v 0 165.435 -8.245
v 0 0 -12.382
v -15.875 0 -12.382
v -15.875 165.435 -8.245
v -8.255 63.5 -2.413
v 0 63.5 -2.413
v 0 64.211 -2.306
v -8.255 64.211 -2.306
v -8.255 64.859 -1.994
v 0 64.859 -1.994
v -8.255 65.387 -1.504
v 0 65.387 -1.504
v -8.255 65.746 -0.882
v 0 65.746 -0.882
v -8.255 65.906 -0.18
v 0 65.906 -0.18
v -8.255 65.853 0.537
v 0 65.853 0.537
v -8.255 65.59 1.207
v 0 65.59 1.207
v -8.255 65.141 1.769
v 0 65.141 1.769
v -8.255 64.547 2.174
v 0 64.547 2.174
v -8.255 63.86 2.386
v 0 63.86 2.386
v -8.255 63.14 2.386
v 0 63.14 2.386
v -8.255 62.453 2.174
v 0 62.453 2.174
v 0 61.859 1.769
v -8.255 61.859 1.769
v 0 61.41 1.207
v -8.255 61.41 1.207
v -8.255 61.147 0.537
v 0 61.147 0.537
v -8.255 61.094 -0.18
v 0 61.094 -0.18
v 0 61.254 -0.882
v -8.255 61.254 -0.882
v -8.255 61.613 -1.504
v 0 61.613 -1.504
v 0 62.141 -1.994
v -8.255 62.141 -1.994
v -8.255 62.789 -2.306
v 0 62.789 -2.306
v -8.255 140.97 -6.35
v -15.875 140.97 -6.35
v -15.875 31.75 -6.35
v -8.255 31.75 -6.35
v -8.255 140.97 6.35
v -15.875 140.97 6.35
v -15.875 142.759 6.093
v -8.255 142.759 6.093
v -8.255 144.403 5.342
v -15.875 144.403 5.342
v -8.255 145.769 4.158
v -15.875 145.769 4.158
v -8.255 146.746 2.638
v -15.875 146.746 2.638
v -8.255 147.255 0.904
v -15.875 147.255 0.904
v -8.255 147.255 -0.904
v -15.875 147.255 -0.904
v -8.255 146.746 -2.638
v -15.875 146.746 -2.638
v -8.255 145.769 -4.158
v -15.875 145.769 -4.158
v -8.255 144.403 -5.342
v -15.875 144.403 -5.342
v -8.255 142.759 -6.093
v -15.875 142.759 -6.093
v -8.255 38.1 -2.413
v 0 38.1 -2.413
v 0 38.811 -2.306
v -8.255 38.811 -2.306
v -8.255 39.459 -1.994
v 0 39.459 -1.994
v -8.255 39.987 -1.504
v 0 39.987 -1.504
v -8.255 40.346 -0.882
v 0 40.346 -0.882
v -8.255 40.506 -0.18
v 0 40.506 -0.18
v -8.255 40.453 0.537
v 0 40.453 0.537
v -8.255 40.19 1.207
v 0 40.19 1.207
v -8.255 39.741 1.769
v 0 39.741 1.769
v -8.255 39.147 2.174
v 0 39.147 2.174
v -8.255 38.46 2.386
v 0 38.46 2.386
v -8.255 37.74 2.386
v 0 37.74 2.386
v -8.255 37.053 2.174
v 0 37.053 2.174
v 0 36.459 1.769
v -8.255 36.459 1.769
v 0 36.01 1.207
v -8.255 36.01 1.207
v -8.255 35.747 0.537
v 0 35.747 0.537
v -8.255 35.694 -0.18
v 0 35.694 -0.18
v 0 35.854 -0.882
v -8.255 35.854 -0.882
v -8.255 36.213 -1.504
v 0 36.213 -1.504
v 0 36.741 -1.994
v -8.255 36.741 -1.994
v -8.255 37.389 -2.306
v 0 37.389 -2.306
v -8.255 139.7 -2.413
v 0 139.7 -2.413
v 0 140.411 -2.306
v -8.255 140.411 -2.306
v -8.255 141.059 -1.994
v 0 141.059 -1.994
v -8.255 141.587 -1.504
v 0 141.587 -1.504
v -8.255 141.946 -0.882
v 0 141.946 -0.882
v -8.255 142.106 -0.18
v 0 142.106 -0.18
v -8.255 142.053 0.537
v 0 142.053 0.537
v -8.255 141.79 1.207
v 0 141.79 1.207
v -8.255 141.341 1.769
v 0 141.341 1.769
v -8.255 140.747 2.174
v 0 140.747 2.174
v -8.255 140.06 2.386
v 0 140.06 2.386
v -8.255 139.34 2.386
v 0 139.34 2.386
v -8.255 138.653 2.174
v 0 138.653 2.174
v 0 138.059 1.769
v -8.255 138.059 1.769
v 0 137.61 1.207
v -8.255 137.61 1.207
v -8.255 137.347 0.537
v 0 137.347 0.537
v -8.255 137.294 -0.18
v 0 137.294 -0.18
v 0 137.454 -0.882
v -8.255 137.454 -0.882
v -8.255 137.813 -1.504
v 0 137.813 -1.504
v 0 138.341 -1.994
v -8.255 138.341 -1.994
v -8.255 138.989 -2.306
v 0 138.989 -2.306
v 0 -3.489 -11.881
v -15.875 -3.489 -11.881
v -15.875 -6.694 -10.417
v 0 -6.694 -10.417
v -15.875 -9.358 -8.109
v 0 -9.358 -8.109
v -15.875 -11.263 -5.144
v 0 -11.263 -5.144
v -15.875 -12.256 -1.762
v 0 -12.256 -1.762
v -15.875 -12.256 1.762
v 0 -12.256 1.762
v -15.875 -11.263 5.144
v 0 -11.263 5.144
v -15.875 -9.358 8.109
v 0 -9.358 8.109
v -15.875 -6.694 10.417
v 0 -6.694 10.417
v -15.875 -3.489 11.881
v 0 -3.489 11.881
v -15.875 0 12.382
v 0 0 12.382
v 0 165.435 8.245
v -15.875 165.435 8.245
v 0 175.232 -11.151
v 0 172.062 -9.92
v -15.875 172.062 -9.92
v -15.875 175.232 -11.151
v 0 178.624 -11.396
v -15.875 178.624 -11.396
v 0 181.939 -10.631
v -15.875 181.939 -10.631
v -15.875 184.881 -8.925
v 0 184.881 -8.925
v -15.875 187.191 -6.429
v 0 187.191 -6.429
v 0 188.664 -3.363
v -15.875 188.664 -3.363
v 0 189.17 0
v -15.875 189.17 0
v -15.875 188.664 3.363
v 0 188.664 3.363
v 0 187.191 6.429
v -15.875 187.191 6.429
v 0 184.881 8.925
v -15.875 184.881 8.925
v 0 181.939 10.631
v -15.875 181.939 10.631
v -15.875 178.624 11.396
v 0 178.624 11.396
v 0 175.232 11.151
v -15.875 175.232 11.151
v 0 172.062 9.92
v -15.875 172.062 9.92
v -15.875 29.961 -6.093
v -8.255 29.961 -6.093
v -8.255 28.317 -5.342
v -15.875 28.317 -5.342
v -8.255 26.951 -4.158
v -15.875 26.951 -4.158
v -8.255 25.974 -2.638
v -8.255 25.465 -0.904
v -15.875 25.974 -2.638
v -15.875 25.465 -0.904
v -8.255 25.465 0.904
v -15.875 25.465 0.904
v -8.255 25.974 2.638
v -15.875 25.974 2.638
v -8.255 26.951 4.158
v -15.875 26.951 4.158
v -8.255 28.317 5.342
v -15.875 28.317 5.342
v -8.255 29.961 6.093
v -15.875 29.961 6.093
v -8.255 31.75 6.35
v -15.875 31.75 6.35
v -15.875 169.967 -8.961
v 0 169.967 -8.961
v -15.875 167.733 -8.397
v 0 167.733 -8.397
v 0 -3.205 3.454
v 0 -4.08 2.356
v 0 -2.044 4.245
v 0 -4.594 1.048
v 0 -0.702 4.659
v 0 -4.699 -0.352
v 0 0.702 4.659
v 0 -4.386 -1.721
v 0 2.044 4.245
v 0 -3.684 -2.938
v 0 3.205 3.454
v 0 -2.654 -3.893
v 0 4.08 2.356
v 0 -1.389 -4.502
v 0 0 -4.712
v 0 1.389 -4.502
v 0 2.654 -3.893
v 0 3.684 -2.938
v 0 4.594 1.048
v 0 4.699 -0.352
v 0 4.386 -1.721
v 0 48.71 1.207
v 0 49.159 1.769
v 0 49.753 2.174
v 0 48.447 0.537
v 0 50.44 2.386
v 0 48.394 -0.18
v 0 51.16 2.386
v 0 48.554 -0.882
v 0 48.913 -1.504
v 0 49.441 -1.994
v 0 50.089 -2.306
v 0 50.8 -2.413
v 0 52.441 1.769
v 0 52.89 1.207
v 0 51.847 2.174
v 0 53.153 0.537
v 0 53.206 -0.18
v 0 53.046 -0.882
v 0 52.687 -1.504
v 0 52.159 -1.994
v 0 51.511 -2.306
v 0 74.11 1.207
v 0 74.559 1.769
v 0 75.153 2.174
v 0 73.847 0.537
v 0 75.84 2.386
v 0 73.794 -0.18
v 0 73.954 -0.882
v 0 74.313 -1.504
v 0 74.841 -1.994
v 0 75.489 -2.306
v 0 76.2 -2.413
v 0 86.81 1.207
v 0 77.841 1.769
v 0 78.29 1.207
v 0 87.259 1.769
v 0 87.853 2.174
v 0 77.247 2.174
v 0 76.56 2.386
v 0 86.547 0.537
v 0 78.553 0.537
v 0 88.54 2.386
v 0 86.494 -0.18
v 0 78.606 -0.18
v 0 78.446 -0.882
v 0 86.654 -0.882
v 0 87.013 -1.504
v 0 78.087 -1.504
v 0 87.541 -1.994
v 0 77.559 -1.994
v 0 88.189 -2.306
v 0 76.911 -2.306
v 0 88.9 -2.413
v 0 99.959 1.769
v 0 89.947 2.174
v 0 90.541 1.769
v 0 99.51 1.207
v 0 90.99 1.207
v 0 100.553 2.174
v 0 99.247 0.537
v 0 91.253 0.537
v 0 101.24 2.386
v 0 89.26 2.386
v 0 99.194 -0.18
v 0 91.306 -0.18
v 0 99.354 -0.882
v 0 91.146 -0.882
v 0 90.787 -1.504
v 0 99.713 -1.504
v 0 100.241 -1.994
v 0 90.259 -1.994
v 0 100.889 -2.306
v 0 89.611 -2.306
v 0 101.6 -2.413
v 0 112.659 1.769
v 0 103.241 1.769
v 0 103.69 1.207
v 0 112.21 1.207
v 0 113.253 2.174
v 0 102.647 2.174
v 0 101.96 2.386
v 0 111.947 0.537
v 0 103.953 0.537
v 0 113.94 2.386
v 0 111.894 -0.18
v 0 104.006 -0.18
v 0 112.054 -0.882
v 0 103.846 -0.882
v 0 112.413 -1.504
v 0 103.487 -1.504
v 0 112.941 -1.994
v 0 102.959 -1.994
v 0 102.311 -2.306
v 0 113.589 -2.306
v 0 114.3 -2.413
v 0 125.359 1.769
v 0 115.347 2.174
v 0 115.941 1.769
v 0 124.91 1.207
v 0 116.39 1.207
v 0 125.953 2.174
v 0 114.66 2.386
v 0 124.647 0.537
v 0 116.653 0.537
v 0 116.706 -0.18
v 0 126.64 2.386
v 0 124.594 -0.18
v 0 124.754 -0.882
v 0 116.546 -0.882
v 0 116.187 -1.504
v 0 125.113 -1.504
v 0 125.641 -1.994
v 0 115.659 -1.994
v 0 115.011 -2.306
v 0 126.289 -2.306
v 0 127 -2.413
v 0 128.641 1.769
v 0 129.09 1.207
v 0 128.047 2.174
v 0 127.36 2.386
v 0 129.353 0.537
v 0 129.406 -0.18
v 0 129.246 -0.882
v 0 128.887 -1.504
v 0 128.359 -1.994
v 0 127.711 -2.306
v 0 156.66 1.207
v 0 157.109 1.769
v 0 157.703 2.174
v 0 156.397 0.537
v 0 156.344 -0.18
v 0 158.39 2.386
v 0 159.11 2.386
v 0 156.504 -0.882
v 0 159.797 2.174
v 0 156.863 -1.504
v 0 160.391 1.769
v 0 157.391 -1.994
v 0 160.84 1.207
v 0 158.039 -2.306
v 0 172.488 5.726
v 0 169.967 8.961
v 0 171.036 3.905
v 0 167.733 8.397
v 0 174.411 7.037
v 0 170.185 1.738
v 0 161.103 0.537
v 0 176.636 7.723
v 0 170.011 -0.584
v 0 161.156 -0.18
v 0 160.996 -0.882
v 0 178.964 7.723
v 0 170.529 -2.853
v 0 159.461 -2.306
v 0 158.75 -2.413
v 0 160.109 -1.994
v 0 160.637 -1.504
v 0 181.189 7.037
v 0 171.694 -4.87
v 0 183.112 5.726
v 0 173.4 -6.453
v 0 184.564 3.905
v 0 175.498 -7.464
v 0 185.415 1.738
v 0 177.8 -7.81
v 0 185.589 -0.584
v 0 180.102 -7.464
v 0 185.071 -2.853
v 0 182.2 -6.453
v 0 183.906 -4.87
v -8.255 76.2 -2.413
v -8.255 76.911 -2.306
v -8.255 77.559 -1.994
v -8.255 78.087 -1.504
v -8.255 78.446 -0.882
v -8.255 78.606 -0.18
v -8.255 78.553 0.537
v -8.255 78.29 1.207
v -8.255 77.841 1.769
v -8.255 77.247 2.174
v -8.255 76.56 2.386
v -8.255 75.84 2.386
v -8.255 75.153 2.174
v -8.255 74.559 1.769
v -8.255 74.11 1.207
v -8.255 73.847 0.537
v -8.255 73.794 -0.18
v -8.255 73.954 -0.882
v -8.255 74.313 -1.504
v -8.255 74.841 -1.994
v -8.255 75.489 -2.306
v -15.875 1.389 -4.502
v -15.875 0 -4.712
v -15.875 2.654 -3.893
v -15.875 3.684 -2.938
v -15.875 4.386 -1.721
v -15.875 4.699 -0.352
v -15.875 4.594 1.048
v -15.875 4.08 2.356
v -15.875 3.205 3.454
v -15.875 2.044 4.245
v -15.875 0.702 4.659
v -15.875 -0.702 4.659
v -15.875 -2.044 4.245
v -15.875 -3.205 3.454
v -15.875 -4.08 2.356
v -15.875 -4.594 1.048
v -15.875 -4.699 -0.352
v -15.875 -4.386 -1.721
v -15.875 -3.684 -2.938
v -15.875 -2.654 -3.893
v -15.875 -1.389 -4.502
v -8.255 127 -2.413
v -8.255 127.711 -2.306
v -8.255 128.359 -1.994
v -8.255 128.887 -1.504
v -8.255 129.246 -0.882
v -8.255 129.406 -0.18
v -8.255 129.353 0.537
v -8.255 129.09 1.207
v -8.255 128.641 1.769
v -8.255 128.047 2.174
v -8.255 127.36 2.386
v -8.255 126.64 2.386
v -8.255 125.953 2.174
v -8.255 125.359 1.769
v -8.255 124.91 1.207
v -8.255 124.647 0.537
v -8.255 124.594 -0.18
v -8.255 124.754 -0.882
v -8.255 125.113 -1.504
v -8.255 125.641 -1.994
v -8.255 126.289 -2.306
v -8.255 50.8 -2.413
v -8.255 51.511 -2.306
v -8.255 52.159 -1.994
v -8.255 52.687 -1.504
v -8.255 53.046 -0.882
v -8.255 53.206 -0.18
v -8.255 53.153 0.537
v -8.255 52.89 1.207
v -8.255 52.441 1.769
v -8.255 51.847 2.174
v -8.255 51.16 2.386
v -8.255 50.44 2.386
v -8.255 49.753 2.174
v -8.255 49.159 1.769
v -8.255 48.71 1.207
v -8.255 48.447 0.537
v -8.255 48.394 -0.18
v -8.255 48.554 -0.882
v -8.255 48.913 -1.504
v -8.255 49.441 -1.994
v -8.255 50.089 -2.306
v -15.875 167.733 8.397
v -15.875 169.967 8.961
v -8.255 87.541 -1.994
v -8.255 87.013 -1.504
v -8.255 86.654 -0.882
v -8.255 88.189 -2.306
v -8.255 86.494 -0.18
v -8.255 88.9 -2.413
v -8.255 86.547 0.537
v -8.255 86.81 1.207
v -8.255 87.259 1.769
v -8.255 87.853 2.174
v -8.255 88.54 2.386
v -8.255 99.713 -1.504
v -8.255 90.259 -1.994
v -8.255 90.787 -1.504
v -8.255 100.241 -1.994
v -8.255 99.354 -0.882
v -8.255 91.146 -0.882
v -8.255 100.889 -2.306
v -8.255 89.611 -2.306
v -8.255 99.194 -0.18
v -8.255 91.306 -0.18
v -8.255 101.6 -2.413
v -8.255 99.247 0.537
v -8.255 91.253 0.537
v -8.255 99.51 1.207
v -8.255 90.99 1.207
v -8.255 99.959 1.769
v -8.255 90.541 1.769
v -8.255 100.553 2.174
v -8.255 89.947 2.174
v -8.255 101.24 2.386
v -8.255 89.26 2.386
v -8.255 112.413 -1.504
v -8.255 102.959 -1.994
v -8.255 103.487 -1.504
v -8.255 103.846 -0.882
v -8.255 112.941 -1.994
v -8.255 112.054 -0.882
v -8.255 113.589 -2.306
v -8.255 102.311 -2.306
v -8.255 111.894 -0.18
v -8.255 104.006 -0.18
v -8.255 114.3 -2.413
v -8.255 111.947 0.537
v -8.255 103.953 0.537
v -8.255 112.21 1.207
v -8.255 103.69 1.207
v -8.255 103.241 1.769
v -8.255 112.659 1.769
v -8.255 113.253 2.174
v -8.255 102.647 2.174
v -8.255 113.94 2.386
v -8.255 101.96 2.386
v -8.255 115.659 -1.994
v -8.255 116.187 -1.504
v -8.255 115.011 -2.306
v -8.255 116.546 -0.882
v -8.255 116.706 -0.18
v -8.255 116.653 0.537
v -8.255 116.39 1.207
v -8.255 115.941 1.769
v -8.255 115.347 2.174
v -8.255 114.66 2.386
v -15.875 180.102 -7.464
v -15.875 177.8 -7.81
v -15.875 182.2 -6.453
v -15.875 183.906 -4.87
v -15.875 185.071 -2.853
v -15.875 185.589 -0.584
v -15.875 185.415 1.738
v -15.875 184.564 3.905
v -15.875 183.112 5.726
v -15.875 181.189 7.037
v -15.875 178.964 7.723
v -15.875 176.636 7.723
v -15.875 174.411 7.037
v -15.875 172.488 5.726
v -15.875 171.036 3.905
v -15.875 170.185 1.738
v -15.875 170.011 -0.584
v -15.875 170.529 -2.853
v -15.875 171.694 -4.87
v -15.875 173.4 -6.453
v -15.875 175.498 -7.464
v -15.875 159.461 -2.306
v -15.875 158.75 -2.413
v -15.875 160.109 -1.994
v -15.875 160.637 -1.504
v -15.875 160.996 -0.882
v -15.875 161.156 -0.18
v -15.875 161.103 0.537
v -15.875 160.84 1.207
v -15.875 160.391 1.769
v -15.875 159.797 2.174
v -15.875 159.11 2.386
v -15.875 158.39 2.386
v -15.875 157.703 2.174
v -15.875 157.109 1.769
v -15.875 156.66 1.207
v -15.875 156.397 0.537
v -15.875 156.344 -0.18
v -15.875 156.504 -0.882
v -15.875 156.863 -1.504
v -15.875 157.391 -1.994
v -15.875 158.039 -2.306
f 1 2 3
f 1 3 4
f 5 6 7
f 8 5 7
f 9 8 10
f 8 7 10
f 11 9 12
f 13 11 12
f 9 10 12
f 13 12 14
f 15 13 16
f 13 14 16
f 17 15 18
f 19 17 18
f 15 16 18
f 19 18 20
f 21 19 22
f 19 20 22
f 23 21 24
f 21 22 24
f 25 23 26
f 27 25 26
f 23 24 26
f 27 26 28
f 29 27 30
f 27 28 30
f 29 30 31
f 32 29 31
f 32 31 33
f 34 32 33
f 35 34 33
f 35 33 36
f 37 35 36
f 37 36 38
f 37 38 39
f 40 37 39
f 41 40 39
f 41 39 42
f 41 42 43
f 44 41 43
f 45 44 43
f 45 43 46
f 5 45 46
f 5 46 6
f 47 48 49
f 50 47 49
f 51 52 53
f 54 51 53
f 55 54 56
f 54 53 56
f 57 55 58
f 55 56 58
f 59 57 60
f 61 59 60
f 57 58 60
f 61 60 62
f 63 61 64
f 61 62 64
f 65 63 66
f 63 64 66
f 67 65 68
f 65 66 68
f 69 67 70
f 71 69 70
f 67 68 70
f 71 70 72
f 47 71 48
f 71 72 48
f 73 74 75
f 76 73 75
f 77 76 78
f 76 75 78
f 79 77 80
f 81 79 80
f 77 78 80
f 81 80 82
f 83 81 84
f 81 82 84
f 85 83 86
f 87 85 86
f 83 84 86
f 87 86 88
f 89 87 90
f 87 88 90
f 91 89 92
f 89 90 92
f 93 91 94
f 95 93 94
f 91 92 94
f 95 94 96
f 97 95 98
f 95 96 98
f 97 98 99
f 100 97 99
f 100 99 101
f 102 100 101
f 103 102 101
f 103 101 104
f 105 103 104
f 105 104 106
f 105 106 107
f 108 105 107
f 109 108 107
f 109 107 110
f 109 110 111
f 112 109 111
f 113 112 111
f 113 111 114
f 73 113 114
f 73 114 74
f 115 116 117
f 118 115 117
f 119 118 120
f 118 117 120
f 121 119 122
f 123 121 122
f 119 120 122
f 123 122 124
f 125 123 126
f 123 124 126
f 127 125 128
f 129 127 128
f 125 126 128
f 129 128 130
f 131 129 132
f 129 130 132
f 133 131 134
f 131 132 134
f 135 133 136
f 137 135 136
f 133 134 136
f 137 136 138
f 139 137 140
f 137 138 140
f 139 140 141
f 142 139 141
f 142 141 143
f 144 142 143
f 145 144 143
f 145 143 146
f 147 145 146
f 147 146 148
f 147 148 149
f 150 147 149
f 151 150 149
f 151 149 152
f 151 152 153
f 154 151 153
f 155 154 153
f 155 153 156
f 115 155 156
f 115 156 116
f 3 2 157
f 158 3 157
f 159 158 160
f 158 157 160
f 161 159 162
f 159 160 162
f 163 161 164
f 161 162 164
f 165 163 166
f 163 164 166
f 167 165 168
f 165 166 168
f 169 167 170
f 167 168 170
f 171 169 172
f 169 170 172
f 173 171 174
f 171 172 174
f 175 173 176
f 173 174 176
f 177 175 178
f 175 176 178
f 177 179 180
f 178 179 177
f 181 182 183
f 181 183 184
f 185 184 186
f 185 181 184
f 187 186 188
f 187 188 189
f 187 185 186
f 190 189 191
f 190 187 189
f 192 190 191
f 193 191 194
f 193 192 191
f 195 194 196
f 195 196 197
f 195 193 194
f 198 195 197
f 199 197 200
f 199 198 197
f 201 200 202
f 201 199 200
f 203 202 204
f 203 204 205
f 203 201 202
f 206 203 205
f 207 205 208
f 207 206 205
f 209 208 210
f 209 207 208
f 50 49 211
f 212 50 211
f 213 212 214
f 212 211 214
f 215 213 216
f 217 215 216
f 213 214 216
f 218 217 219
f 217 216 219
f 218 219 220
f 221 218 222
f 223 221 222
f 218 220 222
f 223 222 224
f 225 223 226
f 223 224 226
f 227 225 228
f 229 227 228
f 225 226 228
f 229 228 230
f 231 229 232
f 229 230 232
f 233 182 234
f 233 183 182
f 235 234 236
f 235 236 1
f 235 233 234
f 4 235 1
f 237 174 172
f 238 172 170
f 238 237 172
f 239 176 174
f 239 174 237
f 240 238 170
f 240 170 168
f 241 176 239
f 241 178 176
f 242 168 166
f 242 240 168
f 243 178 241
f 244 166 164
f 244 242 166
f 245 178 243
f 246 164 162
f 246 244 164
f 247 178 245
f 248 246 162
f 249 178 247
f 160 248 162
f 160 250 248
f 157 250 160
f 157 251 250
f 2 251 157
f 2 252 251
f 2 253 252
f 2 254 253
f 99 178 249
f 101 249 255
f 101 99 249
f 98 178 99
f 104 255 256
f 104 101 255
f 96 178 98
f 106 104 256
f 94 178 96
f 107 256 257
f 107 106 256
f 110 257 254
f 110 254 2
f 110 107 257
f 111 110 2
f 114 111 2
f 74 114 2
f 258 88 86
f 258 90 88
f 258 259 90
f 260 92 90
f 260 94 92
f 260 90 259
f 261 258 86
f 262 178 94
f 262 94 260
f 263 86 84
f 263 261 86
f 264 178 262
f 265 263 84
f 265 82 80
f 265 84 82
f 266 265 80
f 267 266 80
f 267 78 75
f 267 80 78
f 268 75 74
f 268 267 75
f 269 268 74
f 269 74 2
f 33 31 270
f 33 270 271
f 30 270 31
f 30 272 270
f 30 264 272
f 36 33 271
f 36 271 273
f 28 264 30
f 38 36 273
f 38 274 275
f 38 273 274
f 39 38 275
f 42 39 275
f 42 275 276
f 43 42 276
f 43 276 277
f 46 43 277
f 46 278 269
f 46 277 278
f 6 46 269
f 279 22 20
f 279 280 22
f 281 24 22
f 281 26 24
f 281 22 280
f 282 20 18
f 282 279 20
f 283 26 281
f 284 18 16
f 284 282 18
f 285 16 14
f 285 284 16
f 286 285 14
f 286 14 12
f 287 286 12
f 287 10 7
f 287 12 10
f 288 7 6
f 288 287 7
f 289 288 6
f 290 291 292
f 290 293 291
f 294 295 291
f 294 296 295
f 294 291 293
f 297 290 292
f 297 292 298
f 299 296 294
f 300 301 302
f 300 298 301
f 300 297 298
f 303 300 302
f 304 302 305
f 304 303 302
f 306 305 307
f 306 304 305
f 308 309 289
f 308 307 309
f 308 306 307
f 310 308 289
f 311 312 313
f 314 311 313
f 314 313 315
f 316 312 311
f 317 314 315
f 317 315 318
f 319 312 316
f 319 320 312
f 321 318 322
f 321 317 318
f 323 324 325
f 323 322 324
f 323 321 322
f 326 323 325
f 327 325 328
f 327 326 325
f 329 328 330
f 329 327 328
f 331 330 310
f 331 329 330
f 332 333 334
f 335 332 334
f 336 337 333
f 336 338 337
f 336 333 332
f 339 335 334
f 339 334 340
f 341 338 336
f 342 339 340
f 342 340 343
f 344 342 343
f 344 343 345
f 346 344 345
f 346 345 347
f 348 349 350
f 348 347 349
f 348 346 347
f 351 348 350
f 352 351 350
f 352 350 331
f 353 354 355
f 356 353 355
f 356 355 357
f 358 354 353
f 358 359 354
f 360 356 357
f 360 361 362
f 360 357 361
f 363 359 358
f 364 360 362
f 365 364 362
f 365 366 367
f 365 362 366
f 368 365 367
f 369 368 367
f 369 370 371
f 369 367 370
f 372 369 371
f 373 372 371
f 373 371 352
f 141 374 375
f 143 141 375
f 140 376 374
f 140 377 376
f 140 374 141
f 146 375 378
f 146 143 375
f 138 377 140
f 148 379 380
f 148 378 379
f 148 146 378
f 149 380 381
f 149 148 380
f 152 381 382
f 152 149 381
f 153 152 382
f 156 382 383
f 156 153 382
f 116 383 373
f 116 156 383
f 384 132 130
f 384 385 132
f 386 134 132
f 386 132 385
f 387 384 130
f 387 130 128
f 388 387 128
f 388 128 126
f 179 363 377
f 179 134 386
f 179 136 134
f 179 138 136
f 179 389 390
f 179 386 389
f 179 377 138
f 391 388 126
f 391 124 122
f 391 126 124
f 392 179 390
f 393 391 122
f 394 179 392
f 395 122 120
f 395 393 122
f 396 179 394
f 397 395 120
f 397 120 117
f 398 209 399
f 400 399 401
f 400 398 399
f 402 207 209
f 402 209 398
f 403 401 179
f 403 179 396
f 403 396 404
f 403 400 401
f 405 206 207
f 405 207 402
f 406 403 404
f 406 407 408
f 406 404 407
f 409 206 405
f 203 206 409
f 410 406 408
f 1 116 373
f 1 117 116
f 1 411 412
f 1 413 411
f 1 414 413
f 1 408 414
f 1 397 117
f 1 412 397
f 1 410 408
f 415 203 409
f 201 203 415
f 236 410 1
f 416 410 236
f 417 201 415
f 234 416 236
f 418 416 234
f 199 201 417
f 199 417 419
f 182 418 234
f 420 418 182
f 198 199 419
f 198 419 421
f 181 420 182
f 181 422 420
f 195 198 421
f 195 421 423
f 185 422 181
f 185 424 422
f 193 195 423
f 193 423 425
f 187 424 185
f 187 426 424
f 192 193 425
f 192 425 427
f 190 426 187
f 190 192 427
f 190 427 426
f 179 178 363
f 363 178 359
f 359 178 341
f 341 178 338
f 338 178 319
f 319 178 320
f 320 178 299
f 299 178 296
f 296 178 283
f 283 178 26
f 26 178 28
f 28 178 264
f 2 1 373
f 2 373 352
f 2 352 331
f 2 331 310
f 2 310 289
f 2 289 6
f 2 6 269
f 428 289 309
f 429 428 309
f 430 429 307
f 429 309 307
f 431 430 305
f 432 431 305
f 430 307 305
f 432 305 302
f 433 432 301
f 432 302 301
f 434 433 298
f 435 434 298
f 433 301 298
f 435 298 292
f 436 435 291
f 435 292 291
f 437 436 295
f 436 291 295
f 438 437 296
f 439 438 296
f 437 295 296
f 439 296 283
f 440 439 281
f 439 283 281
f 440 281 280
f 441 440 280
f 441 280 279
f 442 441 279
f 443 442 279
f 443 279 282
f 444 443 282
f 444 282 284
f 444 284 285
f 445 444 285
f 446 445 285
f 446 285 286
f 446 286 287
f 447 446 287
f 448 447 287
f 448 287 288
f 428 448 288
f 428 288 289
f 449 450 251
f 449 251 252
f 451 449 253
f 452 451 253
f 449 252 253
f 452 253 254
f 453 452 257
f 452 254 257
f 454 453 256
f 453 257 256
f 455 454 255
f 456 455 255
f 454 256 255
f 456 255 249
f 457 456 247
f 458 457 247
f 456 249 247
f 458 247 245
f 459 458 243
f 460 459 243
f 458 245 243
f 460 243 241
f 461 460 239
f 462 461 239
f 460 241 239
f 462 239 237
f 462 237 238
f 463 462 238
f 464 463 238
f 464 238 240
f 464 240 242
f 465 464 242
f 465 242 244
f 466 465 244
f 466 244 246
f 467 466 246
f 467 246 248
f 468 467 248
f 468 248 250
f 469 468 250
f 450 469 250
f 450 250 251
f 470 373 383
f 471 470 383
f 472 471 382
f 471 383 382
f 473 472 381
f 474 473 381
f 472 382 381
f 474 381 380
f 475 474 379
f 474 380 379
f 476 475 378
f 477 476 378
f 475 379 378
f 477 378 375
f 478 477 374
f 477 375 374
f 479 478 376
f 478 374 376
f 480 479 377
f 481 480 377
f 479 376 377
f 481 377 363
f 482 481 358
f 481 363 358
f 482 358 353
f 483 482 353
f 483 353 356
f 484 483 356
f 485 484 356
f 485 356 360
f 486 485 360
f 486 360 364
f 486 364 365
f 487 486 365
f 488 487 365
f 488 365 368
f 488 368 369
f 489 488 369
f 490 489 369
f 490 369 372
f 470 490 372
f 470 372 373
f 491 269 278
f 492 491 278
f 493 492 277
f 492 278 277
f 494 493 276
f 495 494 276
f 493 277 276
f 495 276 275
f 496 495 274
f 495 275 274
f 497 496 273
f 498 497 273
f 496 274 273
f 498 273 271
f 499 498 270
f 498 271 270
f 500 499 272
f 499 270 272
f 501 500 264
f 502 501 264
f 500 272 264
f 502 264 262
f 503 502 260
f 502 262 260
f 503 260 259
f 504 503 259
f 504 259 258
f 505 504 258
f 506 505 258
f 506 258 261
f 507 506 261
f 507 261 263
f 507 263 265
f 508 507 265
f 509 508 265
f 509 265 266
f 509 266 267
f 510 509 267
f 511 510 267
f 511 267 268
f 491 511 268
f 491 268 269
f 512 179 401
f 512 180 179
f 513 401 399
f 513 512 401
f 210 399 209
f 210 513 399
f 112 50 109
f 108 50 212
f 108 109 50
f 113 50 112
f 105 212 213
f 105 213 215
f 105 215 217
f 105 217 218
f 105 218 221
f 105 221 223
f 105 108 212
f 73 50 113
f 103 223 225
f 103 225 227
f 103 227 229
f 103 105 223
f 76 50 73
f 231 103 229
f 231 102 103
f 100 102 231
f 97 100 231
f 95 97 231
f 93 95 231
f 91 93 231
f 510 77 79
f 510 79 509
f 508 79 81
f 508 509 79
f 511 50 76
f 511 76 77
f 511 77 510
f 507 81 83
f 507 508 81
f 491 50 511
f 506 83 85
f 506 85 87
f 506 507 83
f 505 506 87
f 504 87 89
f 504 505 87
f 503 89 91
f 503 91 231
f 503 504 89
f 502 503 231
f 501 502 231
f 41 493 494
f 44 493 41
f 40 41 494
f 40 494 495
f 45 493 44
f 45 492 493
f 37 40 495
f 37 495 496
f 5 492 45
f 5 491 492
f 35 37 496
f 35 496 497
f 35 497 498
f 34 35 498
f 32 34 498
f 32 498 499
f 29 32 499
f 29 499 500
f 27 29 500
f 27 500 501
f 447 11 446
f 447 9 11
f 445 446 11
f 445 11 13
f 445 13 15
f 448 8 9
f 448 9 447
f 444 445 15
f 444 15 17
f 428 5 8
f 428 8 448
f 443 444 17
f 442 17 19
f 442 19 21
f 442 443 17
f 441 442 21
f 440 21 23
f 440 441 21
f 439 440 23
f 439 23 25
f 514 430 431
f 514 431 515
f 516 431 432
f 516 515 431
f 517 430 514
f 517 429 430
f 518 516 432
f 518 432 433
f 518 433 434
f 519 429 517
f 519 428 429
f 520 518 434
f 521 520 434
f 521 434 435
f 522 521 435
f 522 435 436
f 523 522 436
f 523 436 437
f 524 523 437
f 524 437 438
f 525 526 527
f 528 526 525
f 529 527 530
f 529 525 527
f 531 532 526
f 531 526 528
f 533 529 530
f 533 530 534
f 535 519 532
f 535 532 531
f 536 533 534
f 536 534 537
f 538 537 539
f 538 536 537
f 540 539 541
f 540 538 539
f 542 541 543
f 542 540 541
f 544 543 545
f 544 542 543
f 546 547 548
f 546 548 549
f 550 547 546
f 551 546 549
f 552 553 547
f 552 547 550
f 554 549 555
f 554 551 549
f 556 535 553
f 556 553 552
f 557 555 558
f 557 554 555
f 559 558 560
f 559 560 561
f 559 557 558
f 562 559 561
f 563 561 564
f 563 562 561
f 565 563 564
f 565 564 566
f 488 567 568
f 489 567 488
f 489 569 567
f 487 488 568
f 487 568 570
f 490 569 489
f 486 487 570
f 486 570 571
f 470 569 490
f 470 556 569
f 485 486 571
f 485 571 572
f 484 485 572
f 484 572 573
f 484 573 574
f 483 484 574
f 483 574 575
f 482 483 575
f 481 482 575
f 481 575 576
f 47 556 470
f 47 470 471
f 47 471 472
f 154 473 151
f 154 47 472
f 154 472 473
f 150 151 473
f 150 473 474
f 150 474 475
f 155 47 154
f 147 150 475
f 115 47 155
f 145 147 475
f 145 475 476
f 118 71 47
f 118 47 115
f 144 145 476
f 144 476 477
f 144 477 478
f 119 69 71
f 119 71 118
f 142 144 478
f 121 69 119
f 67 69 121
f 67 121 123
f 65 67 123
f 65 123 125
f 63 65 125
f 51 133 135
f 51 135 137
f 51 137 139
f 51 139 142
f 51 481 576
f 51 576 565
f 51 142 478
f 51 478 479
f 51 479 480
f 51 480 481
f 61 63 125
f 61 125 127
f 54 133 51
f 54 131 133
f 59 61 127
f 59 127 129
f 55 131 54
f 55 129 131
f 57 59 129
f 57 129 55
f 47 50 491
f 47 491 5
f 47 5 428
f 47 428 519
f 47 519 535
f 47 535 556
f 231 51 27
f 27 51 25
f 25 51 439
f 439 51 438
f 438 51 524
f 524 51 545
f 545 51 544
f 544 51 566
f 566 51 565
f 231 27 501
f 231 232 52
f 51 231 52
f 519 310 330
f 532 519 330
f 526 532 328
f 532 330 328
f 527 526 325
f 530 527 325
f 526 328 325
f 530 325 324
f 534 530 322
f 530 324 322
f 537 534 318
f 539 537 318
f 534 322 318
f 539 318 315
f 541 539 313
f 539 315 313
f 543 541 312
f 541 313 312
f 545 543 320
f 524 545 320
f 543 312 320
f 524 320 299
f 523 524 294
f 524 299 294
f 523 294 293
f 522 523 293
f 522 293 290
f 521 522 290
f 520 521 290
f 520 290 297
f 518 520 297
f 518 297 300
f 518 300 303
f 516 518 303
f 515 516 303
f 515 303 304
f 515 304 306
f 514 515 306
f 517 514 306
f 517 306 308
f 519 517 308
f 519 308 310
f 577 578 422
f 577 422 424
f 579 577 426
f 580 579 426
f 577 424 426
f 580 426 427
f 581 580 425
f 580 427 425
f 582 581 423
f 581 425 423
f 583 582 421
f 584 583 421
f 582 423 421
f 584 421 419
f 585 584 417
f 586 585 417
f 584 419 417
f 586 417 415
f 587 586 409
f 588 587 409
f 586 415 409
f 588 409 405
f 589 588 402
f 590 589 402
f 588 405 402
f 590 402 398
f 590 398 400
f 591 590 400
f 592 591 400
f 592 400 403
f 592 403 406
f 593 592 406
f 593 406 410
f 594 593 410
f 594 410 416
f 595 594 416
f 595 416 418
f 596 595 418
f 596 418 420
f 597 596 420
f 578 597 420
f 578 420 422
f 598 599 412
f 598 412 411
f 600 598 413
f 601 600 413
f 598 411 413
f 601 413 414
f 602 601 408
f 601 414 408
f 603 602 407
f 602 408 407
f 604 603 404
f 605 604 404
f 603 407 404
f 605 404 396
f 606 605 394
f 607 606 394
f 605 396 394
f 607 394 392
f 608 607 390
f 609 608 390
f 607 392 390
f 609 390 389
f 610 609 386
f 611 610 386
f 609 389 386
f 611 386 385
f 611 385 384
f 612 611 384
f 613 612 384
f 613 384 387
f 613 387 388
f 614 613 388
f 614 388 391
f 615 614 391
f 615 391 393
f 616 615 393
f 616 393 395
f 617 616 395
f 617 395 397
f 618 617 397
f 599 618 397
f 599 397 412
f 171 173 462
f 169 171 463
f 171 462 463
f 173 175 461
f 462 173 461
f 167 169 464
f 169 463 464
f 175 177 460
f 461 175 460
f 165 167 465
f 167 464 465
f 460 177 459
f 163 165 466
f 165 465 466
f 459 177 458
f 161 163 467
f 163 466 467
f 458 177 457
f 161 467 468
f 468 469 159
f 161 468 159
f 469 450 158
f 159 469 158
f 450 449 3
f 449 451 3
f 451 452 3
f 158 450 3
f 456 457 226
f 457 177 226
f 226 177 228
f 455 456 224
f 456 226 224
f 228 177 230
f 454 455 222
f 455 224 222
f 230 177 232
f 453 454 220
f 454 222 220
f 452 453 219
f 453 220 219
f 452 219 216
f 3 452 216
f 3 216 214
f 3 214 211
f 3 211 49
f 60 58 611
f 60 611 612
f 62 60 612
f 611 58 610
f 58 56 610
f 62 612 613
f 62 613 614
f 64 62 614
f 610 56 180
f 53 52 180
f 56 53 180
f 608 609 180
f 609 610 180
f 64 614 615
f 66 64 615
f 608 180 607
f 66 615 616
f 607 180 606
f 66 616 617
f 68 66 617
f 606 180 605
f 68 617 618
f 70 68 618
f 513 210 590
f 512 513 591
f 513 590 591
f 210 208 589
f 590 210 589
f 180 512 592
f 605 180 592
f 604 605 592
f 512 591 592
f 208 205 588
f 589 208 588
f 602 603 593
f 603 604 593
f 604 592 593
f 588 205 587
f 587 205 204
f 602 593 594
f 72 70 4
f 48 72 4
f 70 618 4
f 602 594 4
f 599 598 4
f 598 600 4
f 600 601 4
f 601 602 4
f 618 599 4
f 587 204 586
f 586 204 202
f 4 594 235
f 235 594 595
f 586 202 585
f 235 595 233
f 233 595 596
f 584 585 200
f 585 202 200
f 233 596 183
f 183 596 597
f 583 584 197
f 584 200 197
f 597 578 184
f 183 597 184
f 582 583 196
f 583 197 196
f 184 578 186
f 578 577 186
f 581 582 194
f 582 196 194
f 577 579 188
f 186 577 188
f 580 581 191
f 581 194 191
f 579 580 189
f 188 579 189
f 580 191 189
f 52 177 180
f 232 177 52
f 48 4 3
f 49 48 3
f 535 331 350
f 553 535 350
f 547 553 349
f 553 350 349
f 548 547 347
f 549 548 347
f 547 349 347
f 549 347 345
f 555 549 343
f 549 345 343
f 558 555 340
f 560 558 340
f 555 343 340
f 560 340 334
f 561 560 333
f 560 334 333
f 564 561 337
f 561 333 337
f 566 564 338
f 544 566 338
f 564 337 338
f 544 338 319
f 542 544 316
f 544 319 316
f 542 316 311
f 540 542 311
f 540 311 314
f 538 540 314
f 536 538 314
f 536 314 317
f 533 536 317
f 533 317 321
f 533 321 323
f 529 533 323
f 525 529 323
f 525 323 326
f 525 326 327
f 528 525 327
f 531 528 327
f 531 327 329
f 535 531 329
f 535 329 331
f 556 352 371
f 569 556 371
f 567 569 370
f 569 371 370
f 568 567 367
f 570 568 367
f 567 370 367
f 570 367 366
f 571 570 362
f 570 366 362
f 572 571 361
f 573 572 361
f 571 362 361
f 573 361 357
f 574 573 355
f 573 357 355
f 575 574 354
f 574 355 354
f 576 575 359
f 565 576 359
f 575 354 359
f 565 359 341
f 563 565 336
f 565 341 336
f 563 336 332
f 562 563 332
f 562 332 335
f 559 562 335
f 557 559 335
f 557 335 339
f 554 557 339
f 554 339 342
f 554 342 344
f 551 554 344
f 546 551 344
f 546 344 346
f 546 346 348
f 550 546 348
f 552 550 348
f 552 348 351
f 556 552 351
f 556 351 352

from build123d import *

# Parameters (mm, degrees)
VERTICAL_BAR_DEPTH     = 15.875
CUT_CABLE_HOLDER_REACH = 17.875
SKETCH5_R              = 2.413
CUT_PIVOT_HOLE_REACH   = 17.875
SKETCH6_R              = 4.7117
CUT_EXTRUDE8_DEPTH     = 16.875
SLOT_CUT_DEPTH         = 7.62
SKETCH10_R             = 7.8105
CUT_EXTRUDE9_DEPTH     = 16.875
FILLET1_R              = 12.7


with BuildPart() as part:
    # Sketch3 → Vertical Bar (new body)
    with BuildSketch(Plane(origin=(0, 0, 0), x_dir=(0, 0, -1), z_dir=(1, 0, 0))):
        with BuildLine():
            Line((-12.7, -12.7), (12.7, -12.7))
            Line((12.7, -12.7), (8.138209265, 169.714598123))
            ThreePointArc((8.138209265, 169.714598123), (0, 189.170459445), (-8.138209265, 169.714598123))
            Line((-8.138209265, 169.714598123), (-12.7, -12.7))
        make_face()
    extrude(amount=-VERTICAL_BAR_DEPTH)

    # Sketch5 → Cut-Cable holder (cut, up to next)
    with BuildSketch(Plane(origin=(0, 0, 0), x_dir=(0, 0, -1), z_dir=(1, 0, 0)), mode=Mode.PRIVATE) as cut_cable_holder_sk1:
        with Locations((0, 50.8)):
            Circle(SKETCH5_R)
    cut_cable_holder_tool1 = extrude(cut_cable_holder_sk1.sketch, amount=-CUT_CABLE_HOLDER_REACH, mode=Mode.PRIVATE) & part.part
    add(cut_cable_holder_tool1.solids().sort_by_distance((0, 50.8, 0))[0], mode=Mode.SUBTRACT)
    # Sketch5 → Cut-Cable holder (cut, up to next)
    with BuildSketch(Plane(origin=(0, 0, 0), x_dir=(0, 0, -1), z_dir=(1, 0, 0)), mode=Mode.PRIVATE) as cut_cable_holder_sk2:
        with Locations((0, 63.5)):
            Circle(SKETCH5_R)
    cut_cable_holder_tool2 = extrude(cut_cable_holder_sk2.sketch, amount=-CUT_CABLE_HOLDER_REACH, mode=Mode.PRIVATE) & part.part
    add(cut_cable_holder_tool2.solids().sort_by_distance((0, 63.5, 0))[0], mode=Mode.SUBTRACT)
    # Sketch5 → Cut-Cable holder (cut, up to next)
    with BuildSketch(Plane(origin=(0, 0, 0), x_dir=(0, 0, -1), z_dir=(1, 0, 0)), mode=Mode.PRIVATE) as cut_cable_holder_sk3:
        with Locations((0, 76.2)):
            Circle(SKETCH5_R)
    cut_cable_holder_tool3 = extrude(cut_cable_holder_sk3.sketch, amount=-CUT_CABLE_HOLDER_REACH, mode=Mode.PRIVATE) & part.part
    add(cut_cable_holder_tool3.solids().sort_by_distance((0, 76.2, 0))[0], mode=Mode.SUBTRACT)
    # Sketch5 → Cut-Cable holder (cut, up to next)
    with BuildSketch(Plane(origin=(0, 0, 0), x_dir=(0, 0, -1), z_dir=(1, 0, 0)), mode=Mode.PRIVATE) as cut_cable_holder_sk4:
        with Locations((0, 88.9)):
            Circle(SKETCH5_R)
    cut_cable_holder_tool4 = extrude(cut_cable_holder_sk4.sketch, amount=-CUT_CABLE_HOLDER_REACH, mode=Mode.PRIVATE) & part.part
    add(cut_cable_holder_tool4.solids().sort_by_distance((0, 88.9, 0))[0], mode=Mode.SUBTRACT)
    # Sketch5 → Cut-Cable holder (cut, up to next)
    with BuildSketch(Plane(origin=(0, 0, 0), x_dir=(0, 0, -1), z_dir=(1, 0, 0)), mode=Mode.PRIVATE) as cut_cable_holder_sk5:
        with Locations((0, 101.6)):
            Circle(SKETCH5_R)
    cut_cable_holder_tool5 = extrude(cut_cable_holder_sk5.sketch, amount=-CUT_CABLE_HOLDER_REACH, mode=Mode.PRIVATE) & part.part
    add(cut_cable_holder_tool5.solids().sort_by_distance((0, 101.6, 0))[0], mode=Mode.SUBTRACT)
    # Sketch5 → Cut-Cable holder (cut, up to next)
    with BuildSketch(Plane(origin=(0, 0, 0), x_dir=(0, 0, -1), z_dir=(1, 0, 0)), mode=Mode.PRIVATE) as cut_cable_holder_sk6:
        with Locations((0, 114.3)):
            Circle(SKETCH5_R)
    cut_cable_holder_tool6 = extrude(cut_cable_holder_sk6.sketch, amount=-CUT_CABLE_HOLDER_REACH, mode=Mode.PRIVATE) & part.part
    add(cut_cable_holder_tool6.solids().sort_by_distance((0, 114.3, 0))[0], mode=Mode.SUBTRACT)
    # Sketch5 → Cut-Cable holder (cut, up to next)
    with BuildSketch(Plane(origin=(0, 0, 0), x_dir=(0, 0, -1), z_dir=(1, 0, 0)), mode=Mode.PRIVATE) as cut_cable_holder_sk7:
        with Locations((0, 127)):
            Circle(SKETCH5_R)
    cut_cable_holder_tool7 = extrude(cut_cable_holder_sk7.sketch, amount=-CUT_CABLE_HOLDER_REACH, mode=Mode.PRIVATE) & part.part
    add(cut_cable_holder_tool7.solids().sort_by_distance((0, 127, 0))[0], mode=Mode.SUBTRACT)
    # Sketch5 → Cut-Cable holder (cut, up to next)
    with BuildSketch(Plane(origin=(0, 0, 0), x_dir=(0, 0, -1), z_dir=(1, 0, 0)), mode=Mode.PRIVATE) as cut_cable_holder_sk8:
        with Locations((0, 139.7)):
            Circle(SKETCH5_R)
    cut_cable_holder_tool8 = extrude(cut_cable_holder_sk8.sketch, amount=-CUT_CABLE_HOLDER_REACH, mode=Mode.PRIVATE) & part.part
    add(cut_cable_holder_tool8.solids().sort_by_distance((0, 139.7, 0))[0], mode=Mode.SUBTRACT)
    # Sketch5 → Cut-Cable holder (cut, up to next)
    with BuildSketch(Plane(origin=(0, 0, 0), x_dir=(0, 0, -1), z_dir=(1, 0, 0)), mode=Mode.PRIVATE) as cut_cable_holder_sk9:
        with Locations((0, 158.75)):
            Circle(SKETCH5_R)
    cut_cable_holder_tool9 = extrude(cut_cable_holder_sk9.sketch, amount=-CUT_CABLE_HOLDER_REACH, mode=Mode.PRIVATE) & part.part
    add(cut_cable_holder_tool9.solids().sort_by_distance((0, 158.75, 0))[0], mode=Mode.SUBTRACT)
    # Sketch5 → Cut-Cable holder (cut, up to next)
    with BuildSketch(Plane(origin=(0, 0, 0), x_dir=(0, 0, -1), z_dir=(1, 0, 0)), mode=Mode.PRIVATE) as cut_cable_holder_sk10:
        with Locations((0, 38.1)):
            Circle(SKETCH5_R)
    cut_cable_holder_tool10 = extrude(cut_cable_holder_sk10.sketch, amount=-CUT_CABLE_HOLDER_REACH, mode=Mode.PRIVATE) & part.part
    add(cut_cable_holder_tool10.solids().sort_by_distance((0, 38.1, 0))[0], mode=Mode.SUBTRACT)

    # Sketch6 → Cut-Pivot hole (cut, up to next)
    with BuildSketch(Plane(origin=(0, 0, 0), x_dir=(0, 0, -1), z_dir=(1, 0, 0)), mode=Mode.PRIVATE) as cut_pivot_hole_sk1:
        Circle(SKETCH6_R)
    cut_pivot_hole_tool1 = extrude(cut_pivot_hole_sk1.sketch, amount=-CUT_PIVOT_HOLE_REACH, mode=Mode.PRIVATE) & part.part
    add(cut_pivot_hole_tool1.solids().sort_by_distance((0, 0, 0))[0], mode=Mode.SUBTRACT)

    # Sketch8 → Cut-Extrude8 (cut, through all)
    with BuildSketch(Plane(origin=(0, 0, 0), x_dir=(0, 0, -1), z_dir=(1, 0, 0))):
        with BuildLine():
            Line((-12.382400735, 0), (-12.7, -12.7))
            Line((-12.7, -12.7), (12.7, -12.7))
            Line((12.7, -12.7), (12.382400735, 0))
            ThreePointArc((12.382400735, 0), (0, -12.382400735), (-12.382400735, 0))
        make_face()
    extrude(amount=-CUT_EXTRUDE8_DEPTH, mode=Mode.SUBTRACT)

    # Sketch9 → Slot Cut (cut)
    with BuildSketch(Plane.ZY.offset(15.875)):
        with BuildLine():
            Line((-6.35, 140.97), (-6.35, 31.75))
            ThreePointArc((-6.35, 31.75), (0, 25.4), (6.35, 31.75))
            Line((6.35, 31.75), (6.35, 140.97))
            ThreePointArc((6.35, 140.97), (0, 147.32), (-6.35, 140.97))
        make_face()
    extrude(amount=-SLOT_CUT_DEPTH, mode=Mode.SUBTRACT)

    # Sketch10 → Cut-Extrude9 (cut, through all)
    with BuildSketch(Plane(origin=(0, 0, 0), x_dir=(0, 0, -1), z_dir=(1, 0, 0))):
        with Locations((0, 177.8)):
            Circle(SKETCH10_R)
    extrude(amount=-CUT_EXTRUDE9_DEPTH, mode=Mode.SUBTRACT)

    # Fillet1
    fillet1_edges = [part.edges().sort_by_distance(p)[0] for p in [
        (-7.9375, 169.714598123, 8.138209265),
        (-7.9375, 169.714598123, -8.138209265),
    ]]
    fillet(fillet1_edges, radius=FILLET1_R)


solid = part.part
